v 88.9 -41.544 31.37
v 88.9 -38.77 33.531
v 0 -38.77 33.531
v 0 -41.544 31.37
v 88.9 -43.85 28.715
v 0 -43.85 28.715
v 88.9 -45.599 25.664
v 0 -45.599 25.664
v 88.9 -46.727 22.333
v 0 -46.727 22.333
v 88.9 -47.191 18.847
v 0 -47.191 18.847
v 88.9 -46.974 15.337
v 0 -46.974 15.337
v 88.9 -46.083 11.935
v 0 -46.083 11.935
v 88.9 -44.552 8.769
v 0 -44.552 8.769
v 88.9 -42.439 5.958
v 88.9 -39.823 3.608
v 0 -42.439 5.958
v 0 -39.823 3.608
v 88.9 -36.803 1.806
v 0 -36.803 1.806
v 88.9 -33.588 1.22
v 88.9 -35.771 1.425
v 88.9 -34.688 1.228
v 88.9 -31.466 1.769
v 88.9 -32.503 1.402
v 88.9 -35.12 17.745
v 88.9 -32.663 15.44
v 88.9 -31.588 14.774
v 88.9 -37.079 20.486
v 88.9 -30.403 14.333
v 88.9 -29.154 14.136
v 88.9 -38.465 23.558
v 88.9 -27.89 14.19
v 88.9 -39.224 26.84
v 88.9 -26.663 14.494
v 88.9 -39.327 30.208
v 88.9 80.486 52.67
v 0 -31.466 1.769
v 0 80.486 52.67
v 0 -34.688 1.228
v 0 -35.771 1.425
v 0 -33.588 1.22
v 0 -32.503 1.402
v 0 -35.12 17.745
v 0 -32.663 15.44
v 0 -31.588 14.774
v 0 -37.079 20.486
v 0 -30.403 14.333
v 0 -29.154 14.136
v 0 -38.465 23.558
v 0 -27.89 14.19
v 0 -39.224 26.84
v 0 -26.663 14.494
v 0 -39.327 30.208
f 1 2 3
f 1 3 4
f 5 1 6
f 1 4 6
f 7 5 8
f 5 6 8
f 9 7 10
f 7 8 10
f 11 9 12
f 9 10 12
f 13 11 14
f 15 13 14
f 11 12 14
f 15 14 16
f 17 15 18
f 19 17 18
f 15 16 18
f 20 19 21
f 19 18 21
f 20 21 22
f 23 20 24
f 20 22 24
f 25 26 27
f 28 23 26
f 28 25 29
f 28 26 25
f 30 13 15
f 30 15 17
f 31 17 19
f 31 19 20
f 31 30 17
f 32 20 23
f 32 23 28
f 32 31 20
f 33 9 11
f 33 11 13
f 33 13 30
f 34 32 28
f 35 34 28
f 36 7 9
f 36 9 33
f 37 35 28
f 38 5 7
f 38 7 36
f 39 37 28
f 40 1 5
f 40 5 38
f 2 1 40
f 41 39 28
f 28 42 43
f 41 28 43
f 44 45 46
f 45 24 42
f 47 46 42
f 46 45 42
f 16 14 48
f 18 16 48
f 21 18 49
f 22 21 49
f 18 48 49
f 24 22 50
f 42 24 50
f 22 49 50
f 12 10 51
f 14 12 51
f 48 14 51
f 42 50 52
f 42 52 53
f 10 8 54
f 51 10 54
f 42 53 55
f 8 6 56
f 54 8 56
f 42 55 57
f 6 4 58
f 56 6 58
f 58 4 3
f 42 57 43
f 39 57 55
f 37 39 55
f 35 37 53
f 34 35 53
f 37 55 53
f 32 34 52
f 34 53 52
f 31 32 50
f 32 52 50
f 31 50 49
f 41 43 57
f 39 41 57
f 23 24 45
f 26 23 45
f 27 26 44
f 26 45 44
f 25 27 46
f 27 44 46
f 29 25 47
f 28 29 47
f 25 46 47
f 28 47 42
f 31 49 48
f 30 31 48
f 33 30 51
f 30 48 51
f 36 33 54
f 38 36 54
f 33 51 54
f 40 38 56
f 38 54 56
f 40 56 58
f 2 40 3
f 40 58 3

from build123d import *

# Parameters (mm, degrees)
F1_DEPTH = 88.9


with BuildPart() as f1:
    # F0 (on Right) → F1 (new body)
    with BuildSketch(Plane.YZ):
        with BuildLine():
            ThreePointArc((-32.662655, 15.440298), (-38.465343, 23.557587), (-38.769789, 33.530996))
            ThreePointArc((-38.769789, 33.530996), (-47.167676, 17.086921), (-36.802551, 1.806337))
            ThreePointArc((-36.802551, 1.806337), (-34.138246, 1.199843), (-31.465744, 1.769124))
            Line((-31.465744, 1.769124), (80.485985, 52.669767))
            Line((80.485985, 52.669767), (-26.662719, 14.49403))
            ThreePointArc((-26.662719, 14.49403), (-29.783168, 14.20324), (-32.662655, 15.440298))
        make_face()
    extrude(amount=F1_DEPTH)


solid = f1.part
